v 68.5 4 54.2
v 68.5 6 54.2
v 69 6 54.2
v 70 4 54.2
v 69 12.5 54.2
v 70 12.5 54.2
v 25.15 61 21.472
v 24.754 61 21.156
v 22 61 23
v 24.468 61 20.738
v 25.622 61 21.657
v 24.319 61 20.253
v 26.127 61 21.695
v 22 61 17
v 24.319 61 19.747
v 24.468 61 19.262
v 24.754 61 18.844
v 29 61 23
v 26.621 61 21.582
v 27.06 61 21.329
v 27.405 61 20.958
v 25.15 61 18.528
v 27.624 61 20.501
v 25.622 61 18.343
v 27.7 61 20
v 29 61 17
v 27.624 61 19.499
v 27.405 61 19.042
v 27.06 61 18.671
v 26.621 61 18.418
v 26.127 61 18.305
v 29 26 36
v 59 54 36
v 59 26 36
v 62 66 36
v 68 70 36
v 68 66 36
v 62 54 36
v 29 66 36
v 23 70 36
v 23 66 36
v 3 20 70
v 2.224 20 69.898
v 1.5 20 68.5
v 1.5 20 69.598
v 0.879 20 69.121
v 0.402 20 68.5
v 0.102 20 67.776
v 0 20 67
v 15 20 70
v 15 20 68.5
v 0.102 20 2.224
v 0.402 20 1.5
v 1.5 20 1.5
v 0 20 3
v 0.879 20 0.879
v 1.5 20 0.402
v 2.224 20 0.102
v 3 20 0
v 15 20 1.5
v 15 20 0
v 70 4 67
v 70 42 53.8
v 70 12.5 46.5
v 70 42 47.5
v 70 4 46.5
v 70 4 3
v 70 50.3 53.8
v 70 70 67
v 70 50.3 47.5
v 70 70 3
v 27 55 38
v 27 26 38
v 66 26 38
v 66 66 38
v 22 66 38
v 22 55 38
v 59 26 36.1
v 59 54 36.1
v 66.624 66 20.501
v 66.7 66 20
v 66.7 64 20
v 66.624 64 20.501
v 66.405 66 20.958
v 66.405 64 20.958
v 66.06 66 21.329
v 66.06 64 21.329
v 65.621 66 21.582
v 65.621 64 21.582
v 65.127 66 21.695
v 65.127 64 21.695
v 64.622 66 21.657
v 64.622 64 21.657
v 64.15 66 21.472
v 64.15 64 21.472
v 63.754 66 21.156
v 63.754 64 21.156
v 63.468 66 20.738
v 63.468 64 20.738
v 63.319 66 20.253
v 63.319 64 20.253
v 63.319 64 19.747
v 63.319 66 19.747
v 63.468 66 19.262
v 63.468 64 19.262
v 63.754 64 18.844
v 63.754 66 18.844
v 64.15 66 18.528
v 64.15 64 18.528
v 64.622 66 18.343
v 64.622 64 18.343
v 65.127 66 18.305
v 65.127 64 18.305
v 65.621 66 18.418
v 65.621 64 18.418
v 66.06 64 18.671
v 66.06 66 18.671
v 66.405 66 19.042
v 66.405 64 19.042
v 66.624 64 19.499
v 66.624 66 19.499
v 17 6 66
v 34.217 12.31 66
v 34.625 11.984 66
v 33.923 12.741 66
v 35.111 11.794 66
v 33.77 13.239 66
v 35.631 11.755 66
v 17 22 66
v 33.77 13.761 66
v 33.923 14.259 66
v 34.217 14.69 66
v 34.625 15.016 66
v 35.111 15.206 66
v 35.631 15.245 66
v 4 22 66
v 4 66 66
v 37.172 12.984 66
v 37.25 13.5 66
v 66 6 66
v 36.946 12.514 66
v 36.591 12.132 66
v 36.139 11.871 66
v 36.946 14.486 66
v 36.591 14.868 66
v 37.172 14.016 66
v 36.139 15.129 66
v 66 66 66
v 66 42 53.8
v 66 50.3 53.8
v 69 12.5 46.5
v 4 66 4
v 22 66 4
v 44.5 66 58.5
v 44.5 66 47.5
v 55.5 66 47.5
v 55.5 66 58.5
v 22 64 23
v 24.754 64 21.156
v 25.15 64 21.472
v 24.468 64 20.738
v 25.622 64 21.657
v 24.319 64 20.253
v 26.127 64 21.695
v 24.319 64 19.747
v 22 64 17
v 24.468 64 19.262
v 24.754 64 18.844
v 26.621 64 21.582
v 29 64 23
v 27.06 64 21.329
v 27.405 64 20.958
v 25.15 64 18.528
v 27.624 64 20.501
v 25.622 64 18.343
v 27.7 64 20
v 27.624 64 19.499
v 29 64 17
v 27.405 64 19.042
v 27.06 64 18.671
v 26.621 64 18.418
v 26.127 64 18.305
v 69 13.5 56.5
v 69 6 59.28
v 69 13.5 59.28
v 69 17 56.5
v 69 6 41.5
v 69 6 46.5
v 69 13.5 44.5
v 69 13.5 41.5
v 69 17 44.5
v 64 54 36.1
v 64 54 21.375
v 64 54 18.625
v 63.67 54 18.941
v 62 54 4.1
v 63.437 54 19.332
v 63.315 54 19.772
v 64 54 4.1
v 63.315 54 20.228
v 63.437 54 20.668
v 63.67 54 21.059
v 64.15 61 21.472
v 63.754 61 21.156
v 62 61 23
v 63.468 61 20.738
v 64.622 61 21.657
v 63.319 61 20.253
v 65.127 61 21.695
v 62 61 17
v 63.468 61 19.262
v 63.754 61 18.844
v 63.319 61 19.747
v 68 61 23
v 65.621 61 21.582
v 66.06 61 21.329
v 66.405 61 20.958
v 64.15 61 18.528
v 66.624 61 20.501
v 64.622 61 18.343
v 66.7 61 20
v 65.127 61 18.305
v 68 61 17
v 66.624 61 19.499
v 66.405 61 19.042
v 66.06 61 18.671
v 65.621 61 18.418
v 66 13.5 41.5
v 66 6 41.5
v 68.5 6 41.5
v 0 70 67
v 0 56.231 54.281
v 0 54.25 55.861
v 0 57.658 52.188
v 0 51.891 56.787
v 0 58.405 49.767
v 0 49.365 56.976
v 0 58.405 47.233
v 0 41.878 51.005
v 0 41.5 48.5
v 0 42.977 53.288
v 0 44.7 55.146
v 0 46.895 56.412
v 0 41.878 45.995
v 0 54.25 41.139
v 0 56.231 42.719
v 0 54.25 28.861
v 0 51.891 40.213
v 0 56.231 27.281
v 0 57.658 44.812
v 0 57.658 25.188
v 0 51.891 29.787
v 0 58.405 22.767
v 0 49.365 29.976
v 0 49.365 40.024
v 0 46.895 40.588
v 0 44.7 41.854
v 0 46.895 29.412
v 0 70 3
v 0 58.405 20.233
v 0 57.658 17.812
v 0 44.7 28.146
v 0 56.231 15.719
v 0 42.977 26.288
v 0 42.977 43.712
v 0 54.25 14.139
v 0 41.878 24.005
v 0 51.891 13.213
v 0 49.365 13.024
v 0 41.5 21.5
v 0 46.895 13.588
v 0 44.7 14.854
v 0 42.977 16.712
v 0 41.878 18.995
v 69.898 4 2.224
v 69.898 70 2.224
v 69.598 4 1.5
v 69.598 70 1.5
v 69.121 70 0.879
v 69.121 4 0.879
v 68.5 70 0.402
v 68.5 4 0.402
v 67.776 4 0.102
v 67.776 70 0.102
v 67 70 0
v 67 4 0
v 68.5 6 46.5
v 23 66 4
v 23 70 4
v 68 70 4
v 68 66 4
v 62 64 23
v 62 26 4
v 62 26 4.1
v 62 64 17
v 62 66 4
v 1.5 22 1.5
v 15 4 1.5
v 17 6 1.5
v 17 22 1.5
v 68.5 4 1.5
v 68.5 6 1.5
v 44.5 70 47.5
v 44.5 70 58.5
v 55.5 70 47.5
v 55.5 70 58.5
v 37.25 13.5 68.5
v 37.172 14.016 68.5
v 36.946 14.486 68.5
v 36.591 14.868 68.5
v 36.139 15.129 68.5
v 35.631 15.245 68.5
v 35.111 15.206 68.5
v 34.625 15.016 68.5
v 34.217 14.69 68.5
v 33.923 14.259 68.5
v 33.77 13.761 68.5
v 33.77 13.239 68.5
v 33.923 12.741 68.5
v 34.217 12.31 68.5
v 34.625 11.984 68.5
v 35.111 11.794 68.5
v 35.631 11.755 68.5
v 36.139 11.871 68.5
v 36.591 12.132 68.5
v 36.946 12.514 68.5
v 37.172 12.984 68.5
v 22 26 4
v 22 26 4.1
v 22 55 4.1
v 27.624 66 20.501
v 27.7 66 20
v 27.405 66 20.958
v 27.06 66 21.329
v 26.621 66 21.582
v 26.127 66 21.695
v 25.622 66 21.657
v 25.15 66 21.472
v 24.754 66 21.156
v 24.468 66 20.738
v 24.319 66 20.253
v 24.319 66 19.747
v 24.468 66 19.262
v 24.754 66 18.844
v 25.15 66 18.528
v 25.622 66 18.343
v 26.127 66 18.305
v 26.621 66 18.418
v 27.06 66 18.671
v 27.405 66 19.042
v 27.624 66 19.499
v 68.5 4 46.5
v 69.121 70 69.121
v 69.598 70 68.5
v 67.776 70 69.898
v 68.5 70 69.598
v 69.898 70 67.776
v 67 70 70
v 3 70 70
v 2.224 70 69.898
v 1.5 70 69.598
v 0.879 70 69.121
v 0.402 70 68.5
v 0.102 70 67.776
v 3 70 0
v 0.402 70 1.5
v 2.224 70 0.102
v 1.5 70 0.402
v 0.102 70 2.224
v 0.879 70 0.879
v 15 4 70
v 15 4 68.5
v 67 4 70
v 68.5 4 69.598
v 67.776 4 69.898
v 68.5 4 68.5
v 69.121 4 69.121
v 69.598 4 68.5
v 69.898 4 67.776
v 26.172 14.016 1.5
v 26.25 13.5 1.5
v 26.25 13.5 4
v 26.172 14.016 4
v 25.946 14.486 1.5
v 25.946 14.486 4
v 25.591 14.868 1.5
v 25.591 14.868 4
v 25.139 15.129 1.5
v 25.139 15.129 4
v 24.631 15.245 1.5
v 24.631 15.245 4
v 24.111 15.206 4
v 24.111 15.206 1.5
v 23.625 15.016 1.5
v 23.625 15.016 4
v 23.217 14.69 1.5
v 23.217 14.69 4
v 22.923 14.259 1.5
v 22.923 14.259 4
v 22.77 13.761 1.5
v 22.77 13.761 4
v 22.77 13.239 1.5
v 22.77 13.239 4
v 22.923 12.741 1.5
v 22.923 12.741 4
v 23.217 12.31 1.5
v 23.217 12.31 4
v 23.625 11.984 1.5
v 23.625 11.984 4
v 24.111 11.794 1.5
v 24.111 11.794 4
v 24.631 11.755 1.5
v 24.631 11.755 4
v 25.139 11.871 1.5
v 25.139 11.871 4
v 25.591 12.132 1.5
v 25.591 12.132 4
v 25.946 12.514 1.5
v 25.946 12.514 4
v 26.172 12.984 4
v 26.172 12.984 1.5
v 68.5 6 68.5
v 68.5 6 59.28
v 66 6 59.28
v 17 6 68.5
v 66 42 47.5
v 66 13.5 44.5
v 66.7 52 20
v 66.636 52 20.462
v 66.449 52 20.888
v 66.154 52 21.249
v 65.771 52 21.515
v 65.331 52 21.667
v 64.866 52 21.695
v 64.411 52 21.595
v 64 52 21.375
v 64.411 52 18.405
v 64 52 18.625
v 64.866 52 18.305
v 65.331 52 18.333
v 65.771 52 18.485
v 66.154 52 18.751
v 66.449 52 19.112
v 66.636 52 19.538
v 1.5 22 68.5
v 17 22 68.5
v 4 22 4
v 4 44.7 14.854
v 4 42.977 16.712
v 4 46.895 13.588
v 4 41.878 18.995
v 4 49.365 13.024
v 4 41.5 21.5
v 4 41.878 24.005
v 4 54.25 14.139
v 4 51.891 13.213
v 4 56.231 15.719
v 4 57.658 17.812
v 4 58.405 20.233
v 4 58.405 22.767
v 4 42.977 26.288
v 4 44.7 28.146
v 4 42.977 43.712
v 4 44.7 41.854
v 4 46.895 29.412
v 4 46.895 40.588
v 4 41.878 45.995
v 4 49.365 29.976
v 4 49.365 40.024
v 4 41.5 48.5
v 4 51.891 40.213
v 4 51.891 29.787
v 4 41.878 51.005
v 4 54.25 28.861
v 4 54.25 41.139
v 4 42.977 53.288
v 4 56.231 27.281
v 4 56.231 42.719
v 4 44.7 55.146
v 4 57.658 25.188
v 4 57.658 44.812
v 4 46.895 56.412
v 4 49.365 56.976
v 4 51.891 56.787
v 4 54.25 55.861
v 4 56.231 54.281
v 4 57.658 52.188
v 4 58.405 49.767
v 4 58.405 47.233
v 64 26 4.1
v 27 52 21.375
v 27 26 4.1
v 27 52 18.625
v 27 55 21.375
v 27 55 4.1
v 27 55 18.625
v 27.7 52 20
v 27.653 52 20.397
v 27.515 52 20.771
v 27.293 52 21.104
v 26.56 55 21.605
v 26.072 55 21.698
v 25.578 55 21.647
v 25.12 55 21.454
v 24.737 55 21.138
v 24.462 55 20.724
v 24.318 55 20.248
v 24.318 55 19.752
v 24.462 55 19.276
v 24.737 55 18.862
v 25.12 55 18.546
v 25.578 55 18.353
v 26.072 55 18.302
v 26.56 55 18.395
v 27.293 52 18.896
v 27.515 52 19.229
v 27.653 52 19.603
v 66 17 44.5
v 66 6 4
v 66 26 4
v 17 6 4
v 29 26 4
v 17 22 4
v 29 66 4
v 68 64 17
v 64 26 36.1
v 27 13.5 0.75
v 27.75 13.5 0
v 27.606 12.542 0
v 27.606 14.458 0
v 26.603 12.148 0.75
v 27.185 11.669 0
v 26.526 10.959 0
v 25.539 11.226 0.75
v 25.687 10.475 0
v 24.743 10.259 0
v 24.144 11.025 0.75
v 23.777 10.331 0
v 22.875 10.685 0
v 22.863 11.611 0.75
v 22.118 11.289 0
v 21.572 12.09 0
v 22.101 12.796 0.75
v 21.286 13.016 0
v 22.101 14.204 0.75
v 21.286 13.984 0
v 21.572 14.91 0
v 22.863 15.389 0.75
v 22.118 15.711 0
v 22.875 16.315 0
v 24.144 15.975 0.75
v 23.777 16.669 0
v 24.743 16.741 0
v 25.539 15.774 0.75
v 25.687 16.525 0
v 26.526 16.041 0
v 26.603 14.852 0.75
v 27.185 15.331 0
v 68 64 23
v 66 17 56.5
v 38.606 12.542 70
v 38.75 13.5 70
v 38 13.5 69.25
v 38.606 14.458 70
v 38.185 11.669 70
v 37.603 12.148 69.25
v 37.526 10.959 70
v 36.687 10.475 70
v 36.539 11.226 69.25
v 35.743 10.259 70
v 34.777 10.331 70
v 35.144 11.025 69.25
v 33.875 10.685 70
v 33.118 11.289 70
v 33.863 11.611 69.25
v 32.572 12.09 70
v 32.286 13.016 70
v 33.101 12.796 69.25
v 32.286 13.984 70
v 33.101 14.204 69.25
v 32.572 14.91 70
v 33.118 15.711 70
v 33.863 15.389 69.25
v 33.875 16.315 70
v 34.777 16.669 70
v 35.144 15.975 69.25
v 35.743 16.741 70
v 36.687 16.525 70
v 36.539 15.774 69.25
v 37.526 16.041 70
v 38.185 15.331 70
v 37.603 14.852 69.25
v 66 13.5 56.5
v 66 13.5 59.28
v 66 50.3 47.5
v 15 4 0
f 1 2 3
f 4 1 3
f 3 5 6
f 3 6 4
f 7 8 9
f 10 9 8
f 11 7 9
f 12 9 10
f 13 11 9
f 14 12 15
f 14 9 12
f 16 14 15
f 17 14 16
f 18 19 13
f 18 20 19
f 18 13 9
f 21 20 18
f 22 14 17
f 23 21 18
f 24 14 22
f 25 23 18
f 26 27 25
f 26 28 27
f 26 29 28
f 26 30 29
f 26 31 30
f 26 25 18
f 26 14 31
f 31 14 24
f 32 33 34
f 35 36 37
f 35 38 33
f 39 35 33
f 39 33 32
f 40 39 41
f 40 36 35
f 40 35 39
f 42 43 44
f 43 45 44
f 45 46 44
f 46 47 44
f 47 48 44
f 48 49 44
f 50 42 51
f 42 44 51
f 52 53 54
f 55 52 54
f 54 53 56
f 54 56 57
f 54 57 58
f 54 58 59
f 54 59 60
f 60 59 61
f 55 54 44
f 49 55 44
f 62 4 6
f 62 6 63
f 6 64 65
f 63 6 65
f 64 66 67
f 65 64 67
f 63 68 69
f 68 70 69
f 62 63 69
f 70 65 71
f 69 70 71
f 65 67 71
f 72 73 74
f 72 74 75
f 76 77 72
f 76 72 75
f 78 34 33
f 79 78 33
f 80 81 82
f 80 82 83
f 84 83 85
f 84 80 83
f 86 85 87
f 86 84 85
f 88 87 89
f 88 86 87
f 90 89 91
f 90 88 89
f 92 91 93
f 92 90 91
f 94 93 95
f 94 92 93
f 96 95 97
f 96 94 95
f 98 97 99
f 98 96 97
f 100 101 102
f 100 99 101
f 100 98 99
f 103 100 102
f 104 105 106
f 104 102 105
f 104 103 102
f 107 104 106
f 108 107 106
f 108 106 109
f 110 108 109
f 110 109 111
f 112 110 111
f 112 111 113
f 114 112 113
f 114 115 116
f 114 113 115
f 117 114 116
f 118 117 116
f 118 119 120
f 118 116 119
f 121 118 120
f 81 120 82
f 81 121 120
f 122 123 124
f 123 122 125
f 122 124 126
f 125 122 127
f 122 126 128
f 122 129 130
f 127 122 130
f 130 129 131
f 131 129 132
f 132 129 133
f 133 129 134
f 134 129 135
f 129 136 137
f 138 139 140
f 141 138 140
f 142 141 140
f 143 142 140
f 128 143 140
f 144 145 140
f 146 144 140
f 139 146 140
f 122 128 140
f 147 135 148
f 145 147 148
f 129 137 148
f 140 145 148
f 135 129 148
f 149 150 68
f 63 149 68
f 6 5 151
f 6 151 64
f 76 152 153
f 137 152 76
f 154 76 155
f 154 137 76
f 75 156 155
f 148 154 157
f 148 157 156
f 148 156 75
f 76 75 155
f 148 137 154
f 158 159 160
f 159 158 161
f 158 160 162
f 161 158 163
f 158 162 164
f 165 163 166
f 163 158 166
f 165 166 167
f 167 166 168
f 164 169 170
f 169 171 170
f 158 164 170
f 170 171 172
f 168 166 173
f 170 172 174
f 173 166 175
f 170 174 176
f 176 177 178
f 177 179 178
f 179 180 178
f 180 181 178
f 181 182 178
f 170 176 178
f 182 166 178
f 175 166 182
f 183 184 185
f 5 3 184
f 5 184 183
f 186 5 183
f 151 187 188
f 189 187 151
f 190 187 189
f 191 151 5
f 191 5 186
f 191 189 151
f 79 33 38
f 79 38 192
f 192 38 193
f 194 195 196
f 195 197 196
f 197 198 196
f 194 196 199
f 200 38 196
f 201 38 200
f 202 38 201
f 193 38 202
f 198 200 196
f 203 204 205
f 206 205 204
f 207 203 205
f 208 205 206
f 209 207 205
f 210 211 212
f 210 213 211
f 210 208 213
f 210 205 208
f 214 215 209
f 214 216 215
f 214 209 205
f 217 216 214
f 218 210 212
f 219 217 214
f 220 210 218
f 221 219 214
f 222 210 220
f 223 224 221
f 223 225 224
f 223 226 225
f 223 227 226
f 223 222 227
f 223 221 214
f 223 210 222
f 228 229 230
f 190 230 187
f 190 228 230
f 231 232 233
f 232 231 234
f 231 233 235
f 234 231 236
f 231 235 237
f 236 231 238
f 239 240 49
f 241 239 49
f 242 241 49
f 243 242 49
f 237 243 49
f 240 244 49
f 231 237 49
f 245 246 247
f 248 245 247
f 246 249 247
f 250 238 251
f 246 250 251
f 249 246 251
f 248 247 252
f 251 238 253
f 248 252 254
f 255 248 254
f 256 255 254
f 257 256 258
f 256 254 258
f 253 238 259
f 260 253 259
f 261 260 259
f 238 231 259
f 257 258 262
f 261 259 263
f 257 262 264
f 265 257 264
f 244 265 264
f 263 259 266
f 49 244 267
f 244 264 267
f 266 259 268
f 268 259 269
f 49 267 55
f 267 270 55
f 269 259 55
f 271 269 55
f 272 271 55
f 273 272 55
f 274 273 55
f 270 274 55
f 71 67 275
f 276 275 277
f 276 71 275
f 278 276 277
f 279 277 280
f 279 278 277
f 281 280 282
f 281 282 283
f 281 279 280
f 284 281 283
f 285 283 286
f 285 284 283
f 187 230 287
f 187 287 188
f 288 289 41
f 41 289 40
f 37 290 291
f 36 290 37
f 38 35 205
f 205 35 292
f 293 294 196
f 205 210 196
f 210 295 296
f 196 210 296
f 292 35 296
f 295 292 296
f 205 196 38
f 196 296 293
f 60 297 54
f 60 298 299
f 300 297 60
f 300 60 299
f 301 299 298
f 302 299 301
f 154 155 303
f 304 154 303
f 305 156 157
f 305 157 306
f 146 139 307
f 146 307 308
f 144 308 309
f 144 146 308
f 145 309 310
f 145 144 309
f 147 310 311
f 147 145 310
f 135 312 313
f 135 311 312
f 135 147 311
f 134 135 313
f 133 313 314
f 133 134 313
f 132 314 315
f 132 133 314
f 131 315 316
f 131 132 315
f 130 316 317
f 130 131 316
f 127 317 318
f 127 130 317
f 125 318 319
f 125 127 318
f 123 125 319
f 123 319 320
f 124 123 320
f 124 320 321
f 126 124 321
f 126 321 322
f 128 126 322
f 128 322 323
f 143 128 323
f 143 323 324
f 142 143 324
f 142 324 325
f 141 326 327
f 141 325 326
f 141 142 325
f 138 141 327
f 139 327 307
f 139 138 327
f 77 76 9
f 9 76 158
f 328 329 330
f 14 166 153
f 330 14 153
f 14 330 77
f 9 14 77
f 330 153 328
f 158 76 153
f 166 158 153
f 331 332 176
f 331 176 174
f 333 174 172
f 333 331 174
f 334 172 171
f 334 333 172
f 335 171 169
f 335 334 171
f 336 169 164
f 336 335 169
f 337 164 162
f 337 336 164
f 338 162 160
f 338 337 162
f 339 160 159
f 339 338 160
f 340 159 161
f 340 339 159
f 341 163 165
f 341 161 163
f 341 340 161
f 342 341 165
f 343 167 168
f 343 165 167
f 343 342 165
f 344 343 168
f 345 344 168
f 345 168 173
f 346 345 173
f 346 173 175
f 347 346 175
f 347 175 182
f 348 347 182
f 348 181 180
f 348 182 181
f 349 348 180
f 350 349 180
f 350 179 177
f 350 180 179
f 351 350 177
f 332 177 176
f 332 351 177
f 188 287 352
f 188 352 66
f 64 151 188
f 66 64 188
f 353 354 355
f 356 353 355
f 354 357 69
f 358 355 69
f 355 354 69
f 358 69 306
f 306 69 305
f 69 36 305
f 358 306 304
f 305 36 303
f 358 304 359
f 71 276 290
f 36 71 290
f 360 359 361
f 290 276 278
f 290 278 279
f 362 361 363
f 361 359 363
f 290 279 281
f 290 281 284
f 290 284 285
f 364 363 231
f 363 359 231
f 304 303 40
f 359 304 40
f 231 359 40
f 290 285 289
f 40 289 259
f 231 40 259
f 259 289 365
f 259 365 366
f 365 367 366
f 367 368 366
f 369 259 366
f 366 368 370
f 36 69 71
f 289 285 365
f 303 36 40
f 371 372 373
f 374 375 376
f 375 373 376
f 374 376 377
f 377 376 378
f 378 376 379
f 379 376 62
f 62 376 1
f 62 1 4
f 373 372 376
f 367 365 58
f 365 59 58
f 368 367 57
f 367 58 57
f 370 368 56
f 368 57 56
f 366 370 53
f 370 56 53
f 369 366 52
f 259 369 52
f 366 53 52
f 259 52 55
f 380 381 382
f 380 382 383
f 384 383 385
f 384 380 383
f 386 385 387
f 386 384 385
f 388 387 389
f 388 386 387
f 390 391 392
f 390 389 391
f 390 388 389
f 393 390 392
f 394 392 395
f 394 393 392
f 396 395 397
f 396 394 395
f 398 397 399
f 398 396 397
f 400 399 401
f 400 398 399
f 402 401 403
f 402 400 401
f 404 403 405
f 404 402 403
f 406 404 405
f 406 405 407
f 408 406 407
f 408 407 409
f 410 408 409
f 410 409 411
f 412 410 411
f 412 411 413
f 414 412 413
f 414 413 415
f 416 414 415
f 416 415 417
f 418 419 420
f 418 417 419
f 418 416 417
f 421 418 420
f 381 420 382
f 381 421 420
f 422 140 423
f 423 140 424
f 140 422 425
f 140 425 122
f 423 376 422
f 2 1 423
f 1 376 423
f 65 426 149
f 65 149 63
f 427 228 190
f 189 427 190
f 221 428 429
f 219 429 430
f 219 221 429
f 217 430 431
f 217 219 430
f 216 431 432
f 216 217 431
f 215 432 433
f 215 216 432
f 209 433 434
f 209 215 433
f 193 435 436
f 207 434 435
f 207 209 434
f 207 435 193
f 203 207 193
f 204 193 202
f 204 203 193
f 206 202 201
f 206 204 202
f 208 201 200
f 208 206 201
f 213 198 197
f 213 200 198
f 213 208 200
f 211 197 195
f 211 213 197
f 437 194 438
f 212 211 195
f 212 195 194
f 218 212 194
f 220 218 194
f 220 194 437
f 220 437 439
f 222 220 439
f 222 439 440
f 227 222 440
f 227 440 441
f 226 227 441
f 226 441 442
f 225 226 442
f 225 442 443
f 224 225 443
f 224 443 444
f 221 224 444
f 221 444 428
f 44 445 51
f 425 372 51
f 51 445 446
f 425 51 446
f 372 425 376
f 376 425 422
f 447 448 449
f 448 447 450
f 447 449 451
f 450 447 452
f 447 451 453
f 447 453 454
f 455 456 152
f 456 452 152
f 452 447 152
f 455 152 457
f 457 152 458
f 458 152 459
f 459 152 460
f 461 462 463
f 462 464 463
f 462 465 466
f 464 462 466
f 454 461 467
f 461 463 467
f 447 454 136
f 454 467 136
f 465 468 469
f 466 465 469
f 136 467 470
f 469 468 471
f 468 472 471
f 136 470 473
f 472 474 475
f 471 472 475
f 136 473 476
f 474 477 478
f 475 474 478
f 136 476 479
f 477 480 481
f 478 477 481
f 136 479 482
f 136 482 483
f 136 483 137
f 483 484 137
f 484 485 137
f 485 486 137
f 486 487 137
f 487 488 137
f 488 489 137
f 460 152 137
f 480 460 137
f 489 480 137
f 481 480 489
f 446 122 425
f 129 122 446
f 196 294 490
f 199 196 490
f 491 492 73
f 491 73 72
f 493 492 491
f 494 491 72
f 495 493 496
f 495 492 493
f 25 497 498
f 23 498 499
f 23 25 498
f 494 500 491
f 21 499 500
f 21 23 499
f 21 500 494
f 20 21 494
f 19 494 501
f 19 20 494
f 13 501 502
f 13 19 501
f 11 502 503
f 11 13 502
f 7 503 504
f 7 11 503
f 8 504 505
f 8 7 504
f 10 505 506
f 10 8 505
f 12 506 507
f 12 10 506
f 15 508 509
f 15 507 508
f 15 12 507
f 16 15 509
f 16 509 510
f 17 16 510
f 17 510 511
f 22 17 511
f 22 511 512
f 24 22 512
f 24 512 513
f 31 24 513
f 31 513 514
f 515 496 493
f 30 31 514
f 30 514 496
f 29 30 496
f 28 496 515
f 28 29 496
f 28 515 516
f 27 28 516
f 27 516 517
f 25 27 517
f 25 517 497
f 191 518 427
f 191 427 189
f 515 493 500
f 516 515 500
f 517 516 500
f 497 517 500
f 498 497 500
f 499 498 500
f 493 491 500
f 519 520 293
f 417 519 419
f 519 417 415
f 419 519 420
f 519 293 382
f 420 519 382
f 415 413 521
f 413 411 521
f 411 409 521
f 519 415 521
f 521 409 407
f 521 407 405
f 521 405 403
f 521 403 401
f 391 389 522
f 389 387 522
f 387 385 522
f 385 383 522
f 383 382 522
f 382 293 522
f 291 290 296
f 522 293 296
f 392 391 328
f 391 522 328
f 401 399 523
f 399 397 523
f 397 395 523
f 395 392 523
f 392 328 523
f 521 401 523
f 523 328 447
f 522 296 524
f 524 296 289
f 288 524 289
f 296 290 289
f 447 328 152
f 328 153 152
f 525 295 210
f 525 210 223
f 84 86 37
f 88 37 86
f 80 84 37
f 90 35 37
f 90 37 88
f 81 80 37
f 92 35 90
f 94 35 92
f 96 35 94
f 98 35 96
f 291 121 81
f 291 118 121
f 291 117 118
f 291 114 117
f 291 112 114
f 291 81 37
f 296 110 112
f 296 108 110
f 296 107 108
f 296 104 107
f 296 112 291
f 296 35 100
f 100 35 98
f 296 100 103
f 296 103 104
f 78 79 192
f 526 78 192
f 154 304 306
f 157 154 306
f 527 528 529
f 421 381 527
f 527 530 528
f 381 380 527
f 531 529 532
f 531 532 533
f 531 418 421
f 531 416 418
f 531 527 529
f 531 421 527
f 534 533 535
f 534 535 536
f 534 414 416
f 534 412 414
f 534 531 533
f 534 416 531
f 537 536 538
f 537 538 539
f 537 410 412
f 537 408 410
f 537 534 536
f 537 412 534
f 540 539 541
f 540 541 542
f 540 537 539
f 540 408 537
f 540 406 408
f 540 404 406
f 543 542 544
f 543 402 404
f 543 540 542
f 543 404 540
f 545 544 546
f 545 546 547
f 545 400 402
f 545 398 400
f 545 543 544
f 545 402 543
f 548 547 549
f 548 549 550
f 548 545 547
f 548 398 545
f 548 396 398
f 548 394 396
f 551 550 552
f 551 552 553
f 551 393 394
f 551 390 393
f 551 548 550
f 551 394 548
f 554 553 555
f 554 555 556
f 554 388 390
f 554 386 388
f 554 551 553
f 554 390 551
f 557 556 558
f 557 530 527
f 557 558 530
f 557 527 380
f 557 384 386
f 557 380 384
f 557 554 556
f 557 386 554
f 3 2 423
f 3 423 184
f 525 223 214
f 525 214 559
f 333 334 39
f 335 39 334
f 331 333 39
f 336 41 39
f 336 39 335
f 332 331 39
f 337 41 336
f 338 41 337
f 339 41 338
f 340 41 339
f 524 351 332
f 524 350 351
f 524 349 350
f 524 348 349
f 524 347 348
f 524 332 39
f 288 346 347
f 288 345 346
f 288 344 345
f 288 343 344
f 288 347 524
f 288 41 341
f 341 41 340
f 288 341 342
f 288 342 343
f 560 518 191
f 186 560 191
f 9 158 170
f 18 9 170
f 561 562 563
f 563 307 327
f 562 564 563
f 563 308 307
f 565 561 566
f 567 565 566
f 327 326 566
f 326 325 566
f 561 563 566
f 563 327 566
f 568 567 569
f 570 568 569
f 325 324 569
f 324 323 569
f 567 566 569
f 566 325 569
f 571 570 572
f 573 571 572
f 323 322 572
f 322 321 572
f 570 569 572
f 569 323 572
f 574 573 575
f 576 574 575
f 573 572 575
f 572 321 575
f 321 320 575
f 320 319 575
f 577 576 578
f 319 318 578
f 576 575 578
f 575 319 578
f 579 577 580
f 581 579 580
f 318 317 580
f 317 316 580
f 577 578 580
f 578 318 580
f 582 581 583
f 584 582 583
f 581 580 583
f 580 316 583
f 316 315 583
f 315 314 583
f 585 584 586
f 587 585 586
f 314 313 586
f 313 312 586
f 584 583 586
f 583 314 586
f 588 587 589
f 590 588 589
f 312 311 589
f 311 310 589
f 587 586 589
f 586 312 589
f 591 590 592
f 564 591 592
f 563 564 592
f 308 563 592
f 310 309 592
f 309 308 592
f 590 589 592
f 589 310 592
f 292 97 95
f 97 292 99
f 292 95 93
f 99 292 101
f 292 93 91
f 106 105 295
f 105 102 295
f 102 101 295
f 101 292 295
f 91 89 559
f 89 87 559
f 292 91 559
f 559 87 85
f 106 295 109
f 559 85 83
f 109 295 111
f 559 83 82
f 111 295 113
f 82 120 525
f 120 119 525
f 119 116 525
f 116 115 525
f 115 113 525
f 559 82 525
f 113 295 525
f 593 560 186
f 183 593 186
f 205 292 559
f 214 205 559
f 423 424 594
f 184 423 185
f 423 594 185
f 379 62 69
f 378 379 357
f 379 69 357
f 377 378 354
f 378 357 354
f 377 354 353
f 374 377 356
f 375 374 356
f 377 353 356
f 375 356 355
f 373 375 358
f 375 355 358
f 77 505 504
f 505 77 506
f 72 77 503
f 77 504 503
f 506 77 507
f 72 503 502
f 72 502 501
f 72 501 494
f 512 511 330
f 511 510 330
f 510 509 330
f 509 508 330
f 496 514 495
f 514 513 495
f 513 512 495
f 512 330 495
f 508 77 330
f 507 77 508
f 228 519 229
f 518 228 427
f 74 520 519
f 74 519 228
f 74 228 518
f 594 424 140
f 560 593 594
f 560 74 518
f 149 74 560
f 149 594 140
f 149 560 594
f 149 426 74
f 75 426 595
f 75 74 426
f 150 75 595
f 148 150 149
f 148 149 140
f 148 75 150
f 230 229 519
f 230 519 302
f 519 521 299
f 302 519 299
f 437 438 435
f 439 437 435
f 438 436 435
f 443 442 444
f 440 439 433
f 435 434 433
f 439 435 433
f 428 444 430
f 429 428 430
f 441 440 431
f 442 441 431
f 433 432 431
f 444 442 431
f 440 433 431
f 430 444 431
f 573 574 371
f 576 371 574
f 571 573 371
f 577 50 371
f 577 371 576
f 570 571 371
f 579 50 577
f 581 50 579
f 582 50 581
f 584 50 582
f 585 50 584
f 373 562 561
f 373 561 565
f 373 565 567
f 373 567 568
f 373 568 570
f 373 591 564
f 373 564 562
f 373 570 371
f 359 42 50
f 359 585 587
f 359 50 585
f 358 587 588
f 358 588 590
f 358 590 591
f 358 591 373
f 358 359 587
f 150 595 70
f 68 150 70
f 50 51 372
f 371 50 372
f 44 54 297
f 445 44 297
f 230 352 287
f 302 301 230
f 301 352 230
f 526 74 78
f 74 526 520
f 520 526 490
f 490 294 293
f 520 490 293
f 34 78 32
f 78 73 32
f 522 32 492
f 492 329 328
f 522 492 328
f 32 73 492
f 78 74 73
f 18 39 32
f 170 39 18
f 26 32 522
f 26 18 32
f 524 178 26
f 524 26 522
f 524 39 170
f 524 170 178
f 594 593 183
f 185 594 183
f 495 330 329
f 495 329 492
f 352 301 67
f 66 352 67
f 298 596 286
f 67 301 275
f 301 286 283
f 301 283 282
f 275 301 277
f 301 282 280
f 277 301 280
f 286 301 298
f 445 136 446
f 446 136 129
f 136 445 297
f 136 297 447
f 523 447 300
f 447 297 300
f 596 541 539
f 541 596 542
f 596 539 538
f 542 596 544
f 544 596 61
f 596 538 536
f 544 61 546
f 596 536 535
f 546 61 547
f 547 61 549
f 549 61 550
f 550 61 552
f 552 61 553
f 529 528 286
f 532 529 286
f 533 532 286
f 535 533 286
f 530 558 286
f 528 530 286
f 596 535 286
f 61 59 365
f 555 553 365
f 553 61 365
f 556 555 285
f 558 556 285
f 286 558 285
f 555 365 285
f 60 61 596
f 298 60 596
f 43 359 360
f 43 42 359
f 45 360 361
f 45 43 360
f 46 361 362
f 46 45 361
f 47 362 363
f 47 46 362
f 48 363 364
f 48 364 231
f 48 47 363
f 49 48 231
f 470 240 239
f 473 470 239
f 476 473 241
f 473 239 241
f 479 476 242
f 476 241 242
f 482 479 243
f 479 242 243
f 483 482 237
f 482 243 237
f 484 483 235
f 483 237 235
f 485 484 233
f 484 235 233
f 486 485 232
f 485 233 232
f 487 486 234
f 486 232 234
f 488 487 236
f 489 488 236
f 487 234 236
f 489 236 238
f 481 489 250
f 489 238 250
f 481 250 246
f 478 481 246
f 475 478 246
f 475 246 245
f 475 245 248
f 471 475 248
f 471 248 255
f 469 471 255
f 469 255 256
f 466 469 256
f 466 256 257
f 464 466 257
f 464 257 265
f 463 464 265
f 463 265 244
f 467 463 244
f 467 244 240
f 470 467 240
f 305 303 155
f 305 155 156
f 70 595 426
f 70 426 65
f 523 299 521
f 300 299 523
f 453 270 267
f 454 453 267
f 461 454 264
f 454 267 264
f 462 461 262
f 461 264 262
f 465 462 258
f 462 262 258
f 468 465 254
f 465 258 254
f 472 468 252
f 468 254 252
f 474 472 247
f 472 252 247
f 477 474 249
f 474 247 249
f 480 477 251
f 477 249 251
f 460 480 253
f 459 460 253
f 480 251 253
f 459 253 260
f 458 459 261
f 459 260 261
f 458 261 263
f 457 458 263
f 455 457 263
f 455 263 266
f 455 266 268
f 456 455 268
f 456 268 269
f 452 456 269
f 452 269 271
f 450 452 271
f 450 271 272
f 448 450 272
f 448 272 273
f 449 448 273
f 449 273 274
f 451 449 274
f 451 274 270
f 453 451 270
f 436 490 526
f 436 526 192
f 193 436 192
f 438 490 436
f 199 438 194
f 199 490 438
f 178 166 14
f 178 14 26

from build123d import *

# Parameters (mm, degrees)
BOX079_W               = 5
BOX079_H               = 29
BOX079_DEPTH           = 34
BOX078_W               = 5
BOX078_H               = 28
BOX078_DEPTH           = 32
BOX077_W               = 8
BOX077_H               = 8.3
BOX077_DEPTH           = 6.3
BOX075_W               = 11
BOX075_H               = 10
BOX075_DEPTH           = 11
BOX066_W               = 3
BOX066_H               = 3.5
BOX066_DEPTH           = 12
BOX065_W               = 3
BOX065_H               = 7.5
BOX065_DEPTH           = 17.78
BOX064_W               = 10
BOX064_H               = 8.5
BOX064_DEPTH           = 7.7
CYLINDER036_R          = 1.75
CYLINDER036_DEPTH      = 15
CYLINDER035_R          = 1.75
CYLINDER035_DEPTH      = 15
BOX035_W               = 8
BOX035_H               = 3
BOX035_DEPTH           = 6
BOX034_W               = 8
BOX034_H               = 3
BOX034_DEPTH           = 6
CYLINDER016_R          = 1.7
CYLINDER016_DEPTH      = 15
CYLINDER016_ROLL_ANGLE = 90
CYLINDER015_R          = 1.7
CYLINDER015_DEPTH      = 15
CYLINDER015_ROLL_ANGLE = 90
BOX031_W               = 39
BOX031_H               = 40
BOX031_DEPTH           = 2
BOX032_W               = 34
BOX032_H               = 40
BOX032_DEPTH           = 7
BOX032_PITCH_ANGLE     = 90
BOX033_W               = 34
BOX033_H               = 40
BOX033_DEPTH           = 4
BOX033_PITCH_ANGLE     = 90
BOX028_W               = 15.5
BOX028_H               = 2
BOX028_DEPTH           = 2.5
BOX027_W               = 15.5
BOX027_H               = 2
BOX027_DEPTH           = 2.5
BOX026_W               = 2
BOX026_H               = 2.5
BOX026_DEPTH           = 14
BOX026_ROLL_ANGLE      = 90
BOX025_W               = 2
BOX025_H               = 2.5
BOX025_DEPTH           = 14
BOX025_ROLL_ANGLE      = 90
BOX024_W               = 2.5
BOX024_H               = 2
BOX024_DEPTH           = 51
BOX024_PITCH_ANGLE     = 90
BOX023_W               = 2.5
BOX023_H               = 2
BOX023_DEPTH           = 51
BOX023_PITCH_ANGLE     = 90
BOX022_W               = 2.5
BOX022_H               = 2
BOX022_DEPTH           = 62
BOX021_W               = 2.5
BOX021_H               = 2
BOX021_DEPTH           = 67
BOX020_W               = 62
BOX020_H               = 62
BOX020_DEPTH           = 62
BOX020_ROLL_ANGLE      = 90
PAD005_DEPTH           = 70
SKETCH010_R            = 8.5
POCKET002004_DEPTH     = 5
SKETCH011_W            = 45
SKETCH011_H            = 32
POCKET002005_DEPTH     = 4
FILLET_R               = 3
CHAMFER007_SIZE        = 1.5


with BuildPart() as cube078:
    # Box079 → Box079 (new body)
    with BuildSketch(Plane(origin=(22, 26, 4.1), x_dir=(1, 0, 0), z_dir=(0, 0, 1))):
        with Locations((2.5, 14.5)):
            Rectangle(BOX079_W, BOX079_H)
    extrude(amount=BOX079_DEPTH)


with BuildPart() as cube077:
    # Box078 → Box078 (new body)
    with BuildSketch(Plane(origin=(59, 26, 4.1), x_dir=(1, 0, 0), z_dir=(0, 0, 1))):
        with Locations((2.5, 14)):
            Rectangle(BOX078_W, BOX078_H)
    extrude(amount=BOX078_DEPTH)


with BuildPart() as cube076:
    # Box077 → Box077 (new body)
    with BuildSketch(Plane(origin=(64, 42, 47.5), x_dir=(1, 0, 0), z_dir=(0, 0, 1))):
        with Locations((4, 4.15)):
            Rectangle(BOX077_W, BOX077_H)
    extrude(amount=BOX077_DEPTH)


with BuildPart() as cube074:
    # Box075 → Box075 (new body)
    with BuildSketch(Plane(origin=(44.5, 62, 47.5), x_dir=(1, 0, 0), z_dir=(0, 0, 1))):
        with Locations((5.5, 5)):
            Rectangle(BOX075_W, BOX075_H)
    extrude(amount=BOX075_DEPTH)


with BuildPart() as cube065:
    # Box066 → Box066 (new body)
    with BuildSketch(Plane(origin=(66, 13.5, 44.5), x_dir=(1, 0, 0), z_dir=(0, 0, 1))):
        with Locations((1.5, 1.75)):
            Rectangle(BOX066_W, BOX066_H)
    extrude(amount=BOX066_DEPTH)


with BuildPart() as cube064:
    # Box065 → Box065 (new body)
    with BuildSketch(Plane(origin=(66, 6, 41.5), x_dir=(1, 0, 0), z_dir=(0, 0, 1))):
        with Locations((1.5, 3.75)):
            Rectangle(BOX065_W, BOX065_H)
    extrude(amount=BOX065_DEPTH)


with BuildPart() as cube063:
    # Box064 → Box064 (new body)
    with BuildSketch(Plane(origin=(60, 4, 46.5), x_dir=(1, 0, 0), z_dir=(0, 0, 1))):
        with Locations((5, 4.25)):
            Rectangle(BOX064_W, BOX064_H)
    extrude(amount=BOX064_DEPTH)


with BuildPart() as cylinder068:
    # Cylinder036 → Cylinder036 (new body)
    with BuildSketch(Plane(origin=(24.5, 13.5, -4), x_dir=(1, 0, 0), z_dir=(0, 0, 1))):
        Circle(CYLINDER036_R)
    extrude(amount=CYLINDER036_DEPTH)


with BuildPart() as cylinder067:
    # Cylinder035 → Cylinder035 (new body)
    with BuildSketch(Plane(origin=(35.5, 13.5, 59), x_dir=(1, 0, 0), z_dir=(0, 0, 1))):
        Circle(CYLINDER035_R)
    extrude(amount=CYLINDER035_DEPTH)


with BuildPart() as cube035:
    # Box035 → Box035 (new body)
    with BuildSketch(Plane(origin=(22, 61, 17), x_dir=(1, 0, 0), z_dir=(0, 0, 1))):
        with Locations((4, 1.5)):
            Rectangle(BOX035_W, BOX035_H)
    extrude(amount=BOX035_DEPTH)


with BuildPart() as cube034:
    # Box034 → Box034 (new body)
    with BuildSketch(Plane(origin=(60, 61, 17), x_dir=(1, 0, 0), z_dir=(0, 0, 1))):
        with Locations((4, 1.5)):
            Rectangle(BOX034_W, BOX034_H)
    extrude(amount=BOX034_DEPTH)


with BuildPart() as cylinder051:
    # Cylinder016 → Cylinder016 (new body)
    with BuildSketch(Plane.XY):
        Circle(CYLINDER016_R)
    extrude(amount=CYLINDER016_DEPTH)


with BuildPart() as cylinder051_1:
    # Cylinder016 roll: moved
    add(cylinder051.part.rotate(Axis((0, 0, 0), (1, 0, 0)), CYLINDER016_ROLL_ANGLE))


with BuildPart() as cylinder051_2:
    # Cylinder016 placement: moved
    add(cylinder051_1.part.moved(Location((26, 67, 20))))


with BuildPart() as cylinder050:
    # Cylinder015 → Cylinder015 (new body)
    with BuildSketch(Plane.XY):
        Circle(CYLINDER015_R)
    extrude(amount=CYLINDER015_DEPTH)


with BuildPart() as cylinder050_1:
    # Cylinder015 roll: moved
    add(cylinder050.part.rotate(Axis((0, 0, 0), (1, 0, 0)), CYLINDER015_ROLL_ANGLE))


with BuildPart() as cylinder050_2:
    # Cylinder015 placement: moved
    add(cylinder050_1.part.moved(Location((65, 67, 20))))


with BuildPart() as cube031:
    # Box031 → Box031 (new body)
    with BuildSketch(Plane(origin=(25, 26, 36), x_dir=(1, 0, 0), z_dir=(0, 0, 1))):
        with Locations((19.5, 20)):
            Rectangle(BOX031_W, BOX031_H)
    extrude(amount=BOX031_DEPTH)


with BuildPart() as cube032:
    # Box032 → Box032 (new body)
    with BuildSketch(Plane.XY):
        with Locations((17, 20)):
            Rectangle(BOX032_W, BOX032_H)
    extrude(amount=BOX032_DEPTH)


with BuildPart() as cube032_1:
    # Box032 pitch: moved
    add(cube032.part.rotate(Axis((0, 0, 0), (0, 1, 0)), BOX032_PITCH_ANGLE))


with BuildPart() as cube032_2:
    # Box032 placement: moved
    add(cube032_1.part.moved(Location((22, 26, 38))))


with BuildPart() as cube033:
    # Box033 → Box033 (new body)
    with BuildSketch(Plane.XY):
        with Locations((17, 20)):
            Rectangle(BOX033_W, BOX033_H)
    extrude(amount=BOX033_DEPTH)


with BuildPart() as cube033_1:
    # Box033 pitch: moved
    add(cube033.part.rotate(Axis((0, 0, 0), (0, 1, 0)), BOX033_PITCH_ANGLE))


with BuildPart() as cube033_2:
    # Box033 placement: moved
    add(cube033_1.part.moved(Location((62, 26, 38))))


with BuildPart() as cube028:
    # Box028 → Box028 (new body)
    with BuildSketch(Plane(origin=(1.5, 20, 66), x_dir=(1, 0, 0), z_dir=(0, 0, 1))):
        with Locations((7.75, 1)):
            Rectangle(BOX028_W, BOX028_H)
    extrude(amount=BOX028_DEPTH)


with BuildPart() as cube027:
    # Box027 → Box027 (new body)
    with BuildSketch(Plane(origin=(1.5, 20, 1.5), x_dir=(1, 0, 0), z_dir=(0, 0, 1))):
        with Locations((7.75, 1)):
            Rectangle(BOX027_W, BOX027_H)
    extrude(amount=BOX027_DEPTH)


with BuildPart() as cube026:
    # Box026 → Box026 (new body)
    with BuildSketch(Plane.XY):
        with Locations((1, 1.25)):
            Rectangle(BOX026_W, BOX026_H)
    extrude(amount=BOX026_DEPTH)


with BuildPart() as cube026_1:
    # Box026 roll: moved
    add(cube026.part.rotate(Axis((0, 0, 0), (1, 0, 0)), BOX026_ROLL_ANGLE))


with BuildPart() as cube026_2:
    # Box026 placement: moved
    add(cube026_1.part.moved(Location((15, 20, 1.5))))


with BuildPart() as cube025:
    # Box025 → Box025 (new body)
    with BuildSketch(Plane.XY):
        with Locations((1, 1.25)):
            Rectangle(BOX025_W, BOX025_H)
    extrude(amount=BOX025_DEPTH)


with BuildPart() as cube025_1:
    # Box025 roll: moved
    add(cube025.part.rotate(Axis((0, 0, 0), (1, 0, 0)), BOX025_ROLL_ANGLE))


with BuildPart() as cube025_2:
    # Box025 placement: moved
    add(cube025_1.part.moved(Location((15, 20, 66))))


with BuildPart() as cube024:
    # Box024 → Box024 (new body)
    with BuildSketch(Plane.XY):
        with Locations((1.25, 1)):
            Rectangle(BOX024_W, BOX024_H)
    extrude(amount=BOX024_DEPTH)


with BuildPart() as cube024_1:
    # Box024 pitch: moved
    add(cube024.part.rotate(Axis((0, 0, 0), (0, 1, 0)), BOX024_PITCH_ANGLE))


with BuildPart() as cube024_2:
    # Box024 placement: moved
    add(cube024_1.part.moved(Location((15, 4, 68.5))))


with BuildPart() as cube023:
    # Box023 → Box023 (new body)
    with BuildSketch(Plane.XY):
        with Locations((1.25, 1)):
            Rectangle(BOX023_W, BOX023_H)
    extrude(amount=BOX023_DEPTH)


with BuildPart() as cube023_1:
    # Box023 pitch: moved
    add(cube023.part.rotate(Axis((0, 0, 0), (0, 1, 0)), BOX023_PITCH_ANGLE))


with BuildPart() as cube023_2:
    # Box023 placement: moved
    add(cube023_1.part.moved(Location((15, 4, 4))))


with BuildPart() as cube022:
    # Box022 → Box022 (new body)
    with BuildSketch(Plane(origin=(1.5, 20, 4), x_dir=(1, 0, 0), z_dir=(0, 0, 1))):
        with Locations((1.25, 1)):
            Rectangle(BOX022_W, BOX022_H)
    extrude(amount=BOX022_DEPTH)


with BuildPart() as cube021:
    # Box021 → Box021 (new body)
    with BuildSketch(Plane(origin=(66, 4, 1.5), x_dir=(1, 0, 0), z_dir=(0, 0, 1))):
        with Locations((1.25, 1)):
            Rectangle(BOX021_W, BOX021_H)
    extrude(amount=BOX021_DEPTH)


with BuildPart() as cube020:
    # Box020 → Box020 (new body)
    with BuildSketch(Plane.XY):
        with Locations((31, 31)):
            Rectangle(BOX020_W, BOX020_H)
    extrude(amount=BOX020_DEPTH)


with BuildPart() as cube020_1:
    # Box020 roll: moved
    add(cube020.part.rotate(Axis((0, 0, 0), (1, 0, 0)), BOX020_ROLL_ANGLE))


with BuildPart() as cube020_2:
    # Box020 placement: moved
    add(cube020_1.part.moved(Location((4, 66, 4))))


with BuildPart() as cut094:
    # Sketch009 → Pad005 (new body)
    with BuildSketch(Plane.XY):
        Polygon((0, 20), (15, 20), (15, 4), (70, 4), (70, 70), (0, 70), align=None)
    extrude(amount=PAD005_DEPTH)

    # Cut024: cut Cube020
    add(cube020_2.part, mode=Mode.SUBTRACT)

    # Cut025: cut Cube021
    add(cube021.part, mode=Mode.SUBTRACT)

    # Cut026: cut Cube022
    add(cube022.part, mode=Mode.SUBTRACT)

    # Cut027: cut Cube023
    add(cube023_2.part, mode=Mode.SUBTRACT)

    # Cut028: cut Cube024
    add(cube024_2.part, mode=Mode.SUBTRACT)

    # Cut029: cut Cube025
    add(cube025_2.part, mode=Mode.SUBTRACT)

    # Cut030: cut Cube026
    add(cube026_2.part, mode=Mode.SUBTRACT)

    # Cut031: cut Cube027
    add(cube027.part, mode=Mode.SUBTRACT)

    # Cut032: cut Cube028
    add(cube028.part, mode=Mode.SUBTRACT)

    # Sketch010 → Pocket002004 (cut)
    with BuildSketch(Plane(origin=(0, 0, 0), x_dir=(0, -1, 0), z_dir=(-1, 0, 0))):
        with Locations((-50, 21.5)):
            Circle(SKETCH010_R)
        with Locations((-50, 48.5)):
            Circle(SKETCH010_R)
    extrude(amount=-POCKET002004_DEPTH, mode=Mode.SUBTRACT)

    # Sketch011 → Pocket002005 (cut)
    with BuildSketch(Plane(origin=(0, 70, 0), x_dir=(-1, 0, 0), z_dir=(0, 1, 0))):
        with Locations((-45.5, 20)):
            Rectangle(SKETCH011_W, SKETCH011_H)
    extrude(amount=-POCKET002005_DEPTH, mode=Mode.SUBTRACT)

    # Fusion007: union Cube031, Cube032, Cube033
    add(cube031.part)
    add(cube032_2.part)
    add(cube033_2.part)

    # Cut033: cut Cylinder050
    add(cylinder050_2.part, mode=Mode.SUBTRACT)

    # Cut034: cut Cylinder051
    add(cylinder051_2.part, mode=Mode.SUBTRACT)

    # Cut035: cut Cube034
    add(cube034.part, mode=Mode.SUBTRACT)

    # Cut036: cut Cube035
    add(cube035.part, mode=Mode.SUBTRACT)

    # Fillet
    fillet_edges = [cut094.edges().sort_by_distance(p)[0] for p in [
        (70, 37, 0),
        (0, 45, 0),
        (70, 37, 70),
        (0, 45, 70),
    ]]
    fillet(fillet_edges, radius=FILLET_R)

    # Cut072: cut Cylinder067
    add(cylinder067.part, mode=Mode.SUBTRACT)

    # Cut073: cut Cylinder068
    add(cylinder068.part, mode=Mode.SUBTRACT)

    # Chamfer007
    chamfer007_edges = [cut094.edges().sort_by_distance(p)[0] for p in [
        (33.75, 13.5, 70),
        (22.75, 13.5, 0),
    ]]
    chamfer(chamfer007_edges, length=CHAMFER007_SIZE)

    # Cut076: cut Cube063
    add(cube063.part, mode=Mode.SUBTRACT)

    # Cut077: cut Cube064
    add(cube064.part, mode=Mode.SUBTRACT)

    # Cut078: cut Cube065
    add(cube065.part, mode=Mode.SUBTRACT)

    # Cut085: cut Cube074
    add(cube074.part, mode=Mode.SUBTRACT)

    # Cut087: cut Cube076
    add(cube076.part, mode=Mode.SUBTRACT)

    # Cut088: cut Cube077
    add(cube077.part, mode=Mode.SUBTRACT)

    # Cut089: cut Cube078
    add(cube078.part, mode=Mode.SUBTRACT)


solid = cut094.part
